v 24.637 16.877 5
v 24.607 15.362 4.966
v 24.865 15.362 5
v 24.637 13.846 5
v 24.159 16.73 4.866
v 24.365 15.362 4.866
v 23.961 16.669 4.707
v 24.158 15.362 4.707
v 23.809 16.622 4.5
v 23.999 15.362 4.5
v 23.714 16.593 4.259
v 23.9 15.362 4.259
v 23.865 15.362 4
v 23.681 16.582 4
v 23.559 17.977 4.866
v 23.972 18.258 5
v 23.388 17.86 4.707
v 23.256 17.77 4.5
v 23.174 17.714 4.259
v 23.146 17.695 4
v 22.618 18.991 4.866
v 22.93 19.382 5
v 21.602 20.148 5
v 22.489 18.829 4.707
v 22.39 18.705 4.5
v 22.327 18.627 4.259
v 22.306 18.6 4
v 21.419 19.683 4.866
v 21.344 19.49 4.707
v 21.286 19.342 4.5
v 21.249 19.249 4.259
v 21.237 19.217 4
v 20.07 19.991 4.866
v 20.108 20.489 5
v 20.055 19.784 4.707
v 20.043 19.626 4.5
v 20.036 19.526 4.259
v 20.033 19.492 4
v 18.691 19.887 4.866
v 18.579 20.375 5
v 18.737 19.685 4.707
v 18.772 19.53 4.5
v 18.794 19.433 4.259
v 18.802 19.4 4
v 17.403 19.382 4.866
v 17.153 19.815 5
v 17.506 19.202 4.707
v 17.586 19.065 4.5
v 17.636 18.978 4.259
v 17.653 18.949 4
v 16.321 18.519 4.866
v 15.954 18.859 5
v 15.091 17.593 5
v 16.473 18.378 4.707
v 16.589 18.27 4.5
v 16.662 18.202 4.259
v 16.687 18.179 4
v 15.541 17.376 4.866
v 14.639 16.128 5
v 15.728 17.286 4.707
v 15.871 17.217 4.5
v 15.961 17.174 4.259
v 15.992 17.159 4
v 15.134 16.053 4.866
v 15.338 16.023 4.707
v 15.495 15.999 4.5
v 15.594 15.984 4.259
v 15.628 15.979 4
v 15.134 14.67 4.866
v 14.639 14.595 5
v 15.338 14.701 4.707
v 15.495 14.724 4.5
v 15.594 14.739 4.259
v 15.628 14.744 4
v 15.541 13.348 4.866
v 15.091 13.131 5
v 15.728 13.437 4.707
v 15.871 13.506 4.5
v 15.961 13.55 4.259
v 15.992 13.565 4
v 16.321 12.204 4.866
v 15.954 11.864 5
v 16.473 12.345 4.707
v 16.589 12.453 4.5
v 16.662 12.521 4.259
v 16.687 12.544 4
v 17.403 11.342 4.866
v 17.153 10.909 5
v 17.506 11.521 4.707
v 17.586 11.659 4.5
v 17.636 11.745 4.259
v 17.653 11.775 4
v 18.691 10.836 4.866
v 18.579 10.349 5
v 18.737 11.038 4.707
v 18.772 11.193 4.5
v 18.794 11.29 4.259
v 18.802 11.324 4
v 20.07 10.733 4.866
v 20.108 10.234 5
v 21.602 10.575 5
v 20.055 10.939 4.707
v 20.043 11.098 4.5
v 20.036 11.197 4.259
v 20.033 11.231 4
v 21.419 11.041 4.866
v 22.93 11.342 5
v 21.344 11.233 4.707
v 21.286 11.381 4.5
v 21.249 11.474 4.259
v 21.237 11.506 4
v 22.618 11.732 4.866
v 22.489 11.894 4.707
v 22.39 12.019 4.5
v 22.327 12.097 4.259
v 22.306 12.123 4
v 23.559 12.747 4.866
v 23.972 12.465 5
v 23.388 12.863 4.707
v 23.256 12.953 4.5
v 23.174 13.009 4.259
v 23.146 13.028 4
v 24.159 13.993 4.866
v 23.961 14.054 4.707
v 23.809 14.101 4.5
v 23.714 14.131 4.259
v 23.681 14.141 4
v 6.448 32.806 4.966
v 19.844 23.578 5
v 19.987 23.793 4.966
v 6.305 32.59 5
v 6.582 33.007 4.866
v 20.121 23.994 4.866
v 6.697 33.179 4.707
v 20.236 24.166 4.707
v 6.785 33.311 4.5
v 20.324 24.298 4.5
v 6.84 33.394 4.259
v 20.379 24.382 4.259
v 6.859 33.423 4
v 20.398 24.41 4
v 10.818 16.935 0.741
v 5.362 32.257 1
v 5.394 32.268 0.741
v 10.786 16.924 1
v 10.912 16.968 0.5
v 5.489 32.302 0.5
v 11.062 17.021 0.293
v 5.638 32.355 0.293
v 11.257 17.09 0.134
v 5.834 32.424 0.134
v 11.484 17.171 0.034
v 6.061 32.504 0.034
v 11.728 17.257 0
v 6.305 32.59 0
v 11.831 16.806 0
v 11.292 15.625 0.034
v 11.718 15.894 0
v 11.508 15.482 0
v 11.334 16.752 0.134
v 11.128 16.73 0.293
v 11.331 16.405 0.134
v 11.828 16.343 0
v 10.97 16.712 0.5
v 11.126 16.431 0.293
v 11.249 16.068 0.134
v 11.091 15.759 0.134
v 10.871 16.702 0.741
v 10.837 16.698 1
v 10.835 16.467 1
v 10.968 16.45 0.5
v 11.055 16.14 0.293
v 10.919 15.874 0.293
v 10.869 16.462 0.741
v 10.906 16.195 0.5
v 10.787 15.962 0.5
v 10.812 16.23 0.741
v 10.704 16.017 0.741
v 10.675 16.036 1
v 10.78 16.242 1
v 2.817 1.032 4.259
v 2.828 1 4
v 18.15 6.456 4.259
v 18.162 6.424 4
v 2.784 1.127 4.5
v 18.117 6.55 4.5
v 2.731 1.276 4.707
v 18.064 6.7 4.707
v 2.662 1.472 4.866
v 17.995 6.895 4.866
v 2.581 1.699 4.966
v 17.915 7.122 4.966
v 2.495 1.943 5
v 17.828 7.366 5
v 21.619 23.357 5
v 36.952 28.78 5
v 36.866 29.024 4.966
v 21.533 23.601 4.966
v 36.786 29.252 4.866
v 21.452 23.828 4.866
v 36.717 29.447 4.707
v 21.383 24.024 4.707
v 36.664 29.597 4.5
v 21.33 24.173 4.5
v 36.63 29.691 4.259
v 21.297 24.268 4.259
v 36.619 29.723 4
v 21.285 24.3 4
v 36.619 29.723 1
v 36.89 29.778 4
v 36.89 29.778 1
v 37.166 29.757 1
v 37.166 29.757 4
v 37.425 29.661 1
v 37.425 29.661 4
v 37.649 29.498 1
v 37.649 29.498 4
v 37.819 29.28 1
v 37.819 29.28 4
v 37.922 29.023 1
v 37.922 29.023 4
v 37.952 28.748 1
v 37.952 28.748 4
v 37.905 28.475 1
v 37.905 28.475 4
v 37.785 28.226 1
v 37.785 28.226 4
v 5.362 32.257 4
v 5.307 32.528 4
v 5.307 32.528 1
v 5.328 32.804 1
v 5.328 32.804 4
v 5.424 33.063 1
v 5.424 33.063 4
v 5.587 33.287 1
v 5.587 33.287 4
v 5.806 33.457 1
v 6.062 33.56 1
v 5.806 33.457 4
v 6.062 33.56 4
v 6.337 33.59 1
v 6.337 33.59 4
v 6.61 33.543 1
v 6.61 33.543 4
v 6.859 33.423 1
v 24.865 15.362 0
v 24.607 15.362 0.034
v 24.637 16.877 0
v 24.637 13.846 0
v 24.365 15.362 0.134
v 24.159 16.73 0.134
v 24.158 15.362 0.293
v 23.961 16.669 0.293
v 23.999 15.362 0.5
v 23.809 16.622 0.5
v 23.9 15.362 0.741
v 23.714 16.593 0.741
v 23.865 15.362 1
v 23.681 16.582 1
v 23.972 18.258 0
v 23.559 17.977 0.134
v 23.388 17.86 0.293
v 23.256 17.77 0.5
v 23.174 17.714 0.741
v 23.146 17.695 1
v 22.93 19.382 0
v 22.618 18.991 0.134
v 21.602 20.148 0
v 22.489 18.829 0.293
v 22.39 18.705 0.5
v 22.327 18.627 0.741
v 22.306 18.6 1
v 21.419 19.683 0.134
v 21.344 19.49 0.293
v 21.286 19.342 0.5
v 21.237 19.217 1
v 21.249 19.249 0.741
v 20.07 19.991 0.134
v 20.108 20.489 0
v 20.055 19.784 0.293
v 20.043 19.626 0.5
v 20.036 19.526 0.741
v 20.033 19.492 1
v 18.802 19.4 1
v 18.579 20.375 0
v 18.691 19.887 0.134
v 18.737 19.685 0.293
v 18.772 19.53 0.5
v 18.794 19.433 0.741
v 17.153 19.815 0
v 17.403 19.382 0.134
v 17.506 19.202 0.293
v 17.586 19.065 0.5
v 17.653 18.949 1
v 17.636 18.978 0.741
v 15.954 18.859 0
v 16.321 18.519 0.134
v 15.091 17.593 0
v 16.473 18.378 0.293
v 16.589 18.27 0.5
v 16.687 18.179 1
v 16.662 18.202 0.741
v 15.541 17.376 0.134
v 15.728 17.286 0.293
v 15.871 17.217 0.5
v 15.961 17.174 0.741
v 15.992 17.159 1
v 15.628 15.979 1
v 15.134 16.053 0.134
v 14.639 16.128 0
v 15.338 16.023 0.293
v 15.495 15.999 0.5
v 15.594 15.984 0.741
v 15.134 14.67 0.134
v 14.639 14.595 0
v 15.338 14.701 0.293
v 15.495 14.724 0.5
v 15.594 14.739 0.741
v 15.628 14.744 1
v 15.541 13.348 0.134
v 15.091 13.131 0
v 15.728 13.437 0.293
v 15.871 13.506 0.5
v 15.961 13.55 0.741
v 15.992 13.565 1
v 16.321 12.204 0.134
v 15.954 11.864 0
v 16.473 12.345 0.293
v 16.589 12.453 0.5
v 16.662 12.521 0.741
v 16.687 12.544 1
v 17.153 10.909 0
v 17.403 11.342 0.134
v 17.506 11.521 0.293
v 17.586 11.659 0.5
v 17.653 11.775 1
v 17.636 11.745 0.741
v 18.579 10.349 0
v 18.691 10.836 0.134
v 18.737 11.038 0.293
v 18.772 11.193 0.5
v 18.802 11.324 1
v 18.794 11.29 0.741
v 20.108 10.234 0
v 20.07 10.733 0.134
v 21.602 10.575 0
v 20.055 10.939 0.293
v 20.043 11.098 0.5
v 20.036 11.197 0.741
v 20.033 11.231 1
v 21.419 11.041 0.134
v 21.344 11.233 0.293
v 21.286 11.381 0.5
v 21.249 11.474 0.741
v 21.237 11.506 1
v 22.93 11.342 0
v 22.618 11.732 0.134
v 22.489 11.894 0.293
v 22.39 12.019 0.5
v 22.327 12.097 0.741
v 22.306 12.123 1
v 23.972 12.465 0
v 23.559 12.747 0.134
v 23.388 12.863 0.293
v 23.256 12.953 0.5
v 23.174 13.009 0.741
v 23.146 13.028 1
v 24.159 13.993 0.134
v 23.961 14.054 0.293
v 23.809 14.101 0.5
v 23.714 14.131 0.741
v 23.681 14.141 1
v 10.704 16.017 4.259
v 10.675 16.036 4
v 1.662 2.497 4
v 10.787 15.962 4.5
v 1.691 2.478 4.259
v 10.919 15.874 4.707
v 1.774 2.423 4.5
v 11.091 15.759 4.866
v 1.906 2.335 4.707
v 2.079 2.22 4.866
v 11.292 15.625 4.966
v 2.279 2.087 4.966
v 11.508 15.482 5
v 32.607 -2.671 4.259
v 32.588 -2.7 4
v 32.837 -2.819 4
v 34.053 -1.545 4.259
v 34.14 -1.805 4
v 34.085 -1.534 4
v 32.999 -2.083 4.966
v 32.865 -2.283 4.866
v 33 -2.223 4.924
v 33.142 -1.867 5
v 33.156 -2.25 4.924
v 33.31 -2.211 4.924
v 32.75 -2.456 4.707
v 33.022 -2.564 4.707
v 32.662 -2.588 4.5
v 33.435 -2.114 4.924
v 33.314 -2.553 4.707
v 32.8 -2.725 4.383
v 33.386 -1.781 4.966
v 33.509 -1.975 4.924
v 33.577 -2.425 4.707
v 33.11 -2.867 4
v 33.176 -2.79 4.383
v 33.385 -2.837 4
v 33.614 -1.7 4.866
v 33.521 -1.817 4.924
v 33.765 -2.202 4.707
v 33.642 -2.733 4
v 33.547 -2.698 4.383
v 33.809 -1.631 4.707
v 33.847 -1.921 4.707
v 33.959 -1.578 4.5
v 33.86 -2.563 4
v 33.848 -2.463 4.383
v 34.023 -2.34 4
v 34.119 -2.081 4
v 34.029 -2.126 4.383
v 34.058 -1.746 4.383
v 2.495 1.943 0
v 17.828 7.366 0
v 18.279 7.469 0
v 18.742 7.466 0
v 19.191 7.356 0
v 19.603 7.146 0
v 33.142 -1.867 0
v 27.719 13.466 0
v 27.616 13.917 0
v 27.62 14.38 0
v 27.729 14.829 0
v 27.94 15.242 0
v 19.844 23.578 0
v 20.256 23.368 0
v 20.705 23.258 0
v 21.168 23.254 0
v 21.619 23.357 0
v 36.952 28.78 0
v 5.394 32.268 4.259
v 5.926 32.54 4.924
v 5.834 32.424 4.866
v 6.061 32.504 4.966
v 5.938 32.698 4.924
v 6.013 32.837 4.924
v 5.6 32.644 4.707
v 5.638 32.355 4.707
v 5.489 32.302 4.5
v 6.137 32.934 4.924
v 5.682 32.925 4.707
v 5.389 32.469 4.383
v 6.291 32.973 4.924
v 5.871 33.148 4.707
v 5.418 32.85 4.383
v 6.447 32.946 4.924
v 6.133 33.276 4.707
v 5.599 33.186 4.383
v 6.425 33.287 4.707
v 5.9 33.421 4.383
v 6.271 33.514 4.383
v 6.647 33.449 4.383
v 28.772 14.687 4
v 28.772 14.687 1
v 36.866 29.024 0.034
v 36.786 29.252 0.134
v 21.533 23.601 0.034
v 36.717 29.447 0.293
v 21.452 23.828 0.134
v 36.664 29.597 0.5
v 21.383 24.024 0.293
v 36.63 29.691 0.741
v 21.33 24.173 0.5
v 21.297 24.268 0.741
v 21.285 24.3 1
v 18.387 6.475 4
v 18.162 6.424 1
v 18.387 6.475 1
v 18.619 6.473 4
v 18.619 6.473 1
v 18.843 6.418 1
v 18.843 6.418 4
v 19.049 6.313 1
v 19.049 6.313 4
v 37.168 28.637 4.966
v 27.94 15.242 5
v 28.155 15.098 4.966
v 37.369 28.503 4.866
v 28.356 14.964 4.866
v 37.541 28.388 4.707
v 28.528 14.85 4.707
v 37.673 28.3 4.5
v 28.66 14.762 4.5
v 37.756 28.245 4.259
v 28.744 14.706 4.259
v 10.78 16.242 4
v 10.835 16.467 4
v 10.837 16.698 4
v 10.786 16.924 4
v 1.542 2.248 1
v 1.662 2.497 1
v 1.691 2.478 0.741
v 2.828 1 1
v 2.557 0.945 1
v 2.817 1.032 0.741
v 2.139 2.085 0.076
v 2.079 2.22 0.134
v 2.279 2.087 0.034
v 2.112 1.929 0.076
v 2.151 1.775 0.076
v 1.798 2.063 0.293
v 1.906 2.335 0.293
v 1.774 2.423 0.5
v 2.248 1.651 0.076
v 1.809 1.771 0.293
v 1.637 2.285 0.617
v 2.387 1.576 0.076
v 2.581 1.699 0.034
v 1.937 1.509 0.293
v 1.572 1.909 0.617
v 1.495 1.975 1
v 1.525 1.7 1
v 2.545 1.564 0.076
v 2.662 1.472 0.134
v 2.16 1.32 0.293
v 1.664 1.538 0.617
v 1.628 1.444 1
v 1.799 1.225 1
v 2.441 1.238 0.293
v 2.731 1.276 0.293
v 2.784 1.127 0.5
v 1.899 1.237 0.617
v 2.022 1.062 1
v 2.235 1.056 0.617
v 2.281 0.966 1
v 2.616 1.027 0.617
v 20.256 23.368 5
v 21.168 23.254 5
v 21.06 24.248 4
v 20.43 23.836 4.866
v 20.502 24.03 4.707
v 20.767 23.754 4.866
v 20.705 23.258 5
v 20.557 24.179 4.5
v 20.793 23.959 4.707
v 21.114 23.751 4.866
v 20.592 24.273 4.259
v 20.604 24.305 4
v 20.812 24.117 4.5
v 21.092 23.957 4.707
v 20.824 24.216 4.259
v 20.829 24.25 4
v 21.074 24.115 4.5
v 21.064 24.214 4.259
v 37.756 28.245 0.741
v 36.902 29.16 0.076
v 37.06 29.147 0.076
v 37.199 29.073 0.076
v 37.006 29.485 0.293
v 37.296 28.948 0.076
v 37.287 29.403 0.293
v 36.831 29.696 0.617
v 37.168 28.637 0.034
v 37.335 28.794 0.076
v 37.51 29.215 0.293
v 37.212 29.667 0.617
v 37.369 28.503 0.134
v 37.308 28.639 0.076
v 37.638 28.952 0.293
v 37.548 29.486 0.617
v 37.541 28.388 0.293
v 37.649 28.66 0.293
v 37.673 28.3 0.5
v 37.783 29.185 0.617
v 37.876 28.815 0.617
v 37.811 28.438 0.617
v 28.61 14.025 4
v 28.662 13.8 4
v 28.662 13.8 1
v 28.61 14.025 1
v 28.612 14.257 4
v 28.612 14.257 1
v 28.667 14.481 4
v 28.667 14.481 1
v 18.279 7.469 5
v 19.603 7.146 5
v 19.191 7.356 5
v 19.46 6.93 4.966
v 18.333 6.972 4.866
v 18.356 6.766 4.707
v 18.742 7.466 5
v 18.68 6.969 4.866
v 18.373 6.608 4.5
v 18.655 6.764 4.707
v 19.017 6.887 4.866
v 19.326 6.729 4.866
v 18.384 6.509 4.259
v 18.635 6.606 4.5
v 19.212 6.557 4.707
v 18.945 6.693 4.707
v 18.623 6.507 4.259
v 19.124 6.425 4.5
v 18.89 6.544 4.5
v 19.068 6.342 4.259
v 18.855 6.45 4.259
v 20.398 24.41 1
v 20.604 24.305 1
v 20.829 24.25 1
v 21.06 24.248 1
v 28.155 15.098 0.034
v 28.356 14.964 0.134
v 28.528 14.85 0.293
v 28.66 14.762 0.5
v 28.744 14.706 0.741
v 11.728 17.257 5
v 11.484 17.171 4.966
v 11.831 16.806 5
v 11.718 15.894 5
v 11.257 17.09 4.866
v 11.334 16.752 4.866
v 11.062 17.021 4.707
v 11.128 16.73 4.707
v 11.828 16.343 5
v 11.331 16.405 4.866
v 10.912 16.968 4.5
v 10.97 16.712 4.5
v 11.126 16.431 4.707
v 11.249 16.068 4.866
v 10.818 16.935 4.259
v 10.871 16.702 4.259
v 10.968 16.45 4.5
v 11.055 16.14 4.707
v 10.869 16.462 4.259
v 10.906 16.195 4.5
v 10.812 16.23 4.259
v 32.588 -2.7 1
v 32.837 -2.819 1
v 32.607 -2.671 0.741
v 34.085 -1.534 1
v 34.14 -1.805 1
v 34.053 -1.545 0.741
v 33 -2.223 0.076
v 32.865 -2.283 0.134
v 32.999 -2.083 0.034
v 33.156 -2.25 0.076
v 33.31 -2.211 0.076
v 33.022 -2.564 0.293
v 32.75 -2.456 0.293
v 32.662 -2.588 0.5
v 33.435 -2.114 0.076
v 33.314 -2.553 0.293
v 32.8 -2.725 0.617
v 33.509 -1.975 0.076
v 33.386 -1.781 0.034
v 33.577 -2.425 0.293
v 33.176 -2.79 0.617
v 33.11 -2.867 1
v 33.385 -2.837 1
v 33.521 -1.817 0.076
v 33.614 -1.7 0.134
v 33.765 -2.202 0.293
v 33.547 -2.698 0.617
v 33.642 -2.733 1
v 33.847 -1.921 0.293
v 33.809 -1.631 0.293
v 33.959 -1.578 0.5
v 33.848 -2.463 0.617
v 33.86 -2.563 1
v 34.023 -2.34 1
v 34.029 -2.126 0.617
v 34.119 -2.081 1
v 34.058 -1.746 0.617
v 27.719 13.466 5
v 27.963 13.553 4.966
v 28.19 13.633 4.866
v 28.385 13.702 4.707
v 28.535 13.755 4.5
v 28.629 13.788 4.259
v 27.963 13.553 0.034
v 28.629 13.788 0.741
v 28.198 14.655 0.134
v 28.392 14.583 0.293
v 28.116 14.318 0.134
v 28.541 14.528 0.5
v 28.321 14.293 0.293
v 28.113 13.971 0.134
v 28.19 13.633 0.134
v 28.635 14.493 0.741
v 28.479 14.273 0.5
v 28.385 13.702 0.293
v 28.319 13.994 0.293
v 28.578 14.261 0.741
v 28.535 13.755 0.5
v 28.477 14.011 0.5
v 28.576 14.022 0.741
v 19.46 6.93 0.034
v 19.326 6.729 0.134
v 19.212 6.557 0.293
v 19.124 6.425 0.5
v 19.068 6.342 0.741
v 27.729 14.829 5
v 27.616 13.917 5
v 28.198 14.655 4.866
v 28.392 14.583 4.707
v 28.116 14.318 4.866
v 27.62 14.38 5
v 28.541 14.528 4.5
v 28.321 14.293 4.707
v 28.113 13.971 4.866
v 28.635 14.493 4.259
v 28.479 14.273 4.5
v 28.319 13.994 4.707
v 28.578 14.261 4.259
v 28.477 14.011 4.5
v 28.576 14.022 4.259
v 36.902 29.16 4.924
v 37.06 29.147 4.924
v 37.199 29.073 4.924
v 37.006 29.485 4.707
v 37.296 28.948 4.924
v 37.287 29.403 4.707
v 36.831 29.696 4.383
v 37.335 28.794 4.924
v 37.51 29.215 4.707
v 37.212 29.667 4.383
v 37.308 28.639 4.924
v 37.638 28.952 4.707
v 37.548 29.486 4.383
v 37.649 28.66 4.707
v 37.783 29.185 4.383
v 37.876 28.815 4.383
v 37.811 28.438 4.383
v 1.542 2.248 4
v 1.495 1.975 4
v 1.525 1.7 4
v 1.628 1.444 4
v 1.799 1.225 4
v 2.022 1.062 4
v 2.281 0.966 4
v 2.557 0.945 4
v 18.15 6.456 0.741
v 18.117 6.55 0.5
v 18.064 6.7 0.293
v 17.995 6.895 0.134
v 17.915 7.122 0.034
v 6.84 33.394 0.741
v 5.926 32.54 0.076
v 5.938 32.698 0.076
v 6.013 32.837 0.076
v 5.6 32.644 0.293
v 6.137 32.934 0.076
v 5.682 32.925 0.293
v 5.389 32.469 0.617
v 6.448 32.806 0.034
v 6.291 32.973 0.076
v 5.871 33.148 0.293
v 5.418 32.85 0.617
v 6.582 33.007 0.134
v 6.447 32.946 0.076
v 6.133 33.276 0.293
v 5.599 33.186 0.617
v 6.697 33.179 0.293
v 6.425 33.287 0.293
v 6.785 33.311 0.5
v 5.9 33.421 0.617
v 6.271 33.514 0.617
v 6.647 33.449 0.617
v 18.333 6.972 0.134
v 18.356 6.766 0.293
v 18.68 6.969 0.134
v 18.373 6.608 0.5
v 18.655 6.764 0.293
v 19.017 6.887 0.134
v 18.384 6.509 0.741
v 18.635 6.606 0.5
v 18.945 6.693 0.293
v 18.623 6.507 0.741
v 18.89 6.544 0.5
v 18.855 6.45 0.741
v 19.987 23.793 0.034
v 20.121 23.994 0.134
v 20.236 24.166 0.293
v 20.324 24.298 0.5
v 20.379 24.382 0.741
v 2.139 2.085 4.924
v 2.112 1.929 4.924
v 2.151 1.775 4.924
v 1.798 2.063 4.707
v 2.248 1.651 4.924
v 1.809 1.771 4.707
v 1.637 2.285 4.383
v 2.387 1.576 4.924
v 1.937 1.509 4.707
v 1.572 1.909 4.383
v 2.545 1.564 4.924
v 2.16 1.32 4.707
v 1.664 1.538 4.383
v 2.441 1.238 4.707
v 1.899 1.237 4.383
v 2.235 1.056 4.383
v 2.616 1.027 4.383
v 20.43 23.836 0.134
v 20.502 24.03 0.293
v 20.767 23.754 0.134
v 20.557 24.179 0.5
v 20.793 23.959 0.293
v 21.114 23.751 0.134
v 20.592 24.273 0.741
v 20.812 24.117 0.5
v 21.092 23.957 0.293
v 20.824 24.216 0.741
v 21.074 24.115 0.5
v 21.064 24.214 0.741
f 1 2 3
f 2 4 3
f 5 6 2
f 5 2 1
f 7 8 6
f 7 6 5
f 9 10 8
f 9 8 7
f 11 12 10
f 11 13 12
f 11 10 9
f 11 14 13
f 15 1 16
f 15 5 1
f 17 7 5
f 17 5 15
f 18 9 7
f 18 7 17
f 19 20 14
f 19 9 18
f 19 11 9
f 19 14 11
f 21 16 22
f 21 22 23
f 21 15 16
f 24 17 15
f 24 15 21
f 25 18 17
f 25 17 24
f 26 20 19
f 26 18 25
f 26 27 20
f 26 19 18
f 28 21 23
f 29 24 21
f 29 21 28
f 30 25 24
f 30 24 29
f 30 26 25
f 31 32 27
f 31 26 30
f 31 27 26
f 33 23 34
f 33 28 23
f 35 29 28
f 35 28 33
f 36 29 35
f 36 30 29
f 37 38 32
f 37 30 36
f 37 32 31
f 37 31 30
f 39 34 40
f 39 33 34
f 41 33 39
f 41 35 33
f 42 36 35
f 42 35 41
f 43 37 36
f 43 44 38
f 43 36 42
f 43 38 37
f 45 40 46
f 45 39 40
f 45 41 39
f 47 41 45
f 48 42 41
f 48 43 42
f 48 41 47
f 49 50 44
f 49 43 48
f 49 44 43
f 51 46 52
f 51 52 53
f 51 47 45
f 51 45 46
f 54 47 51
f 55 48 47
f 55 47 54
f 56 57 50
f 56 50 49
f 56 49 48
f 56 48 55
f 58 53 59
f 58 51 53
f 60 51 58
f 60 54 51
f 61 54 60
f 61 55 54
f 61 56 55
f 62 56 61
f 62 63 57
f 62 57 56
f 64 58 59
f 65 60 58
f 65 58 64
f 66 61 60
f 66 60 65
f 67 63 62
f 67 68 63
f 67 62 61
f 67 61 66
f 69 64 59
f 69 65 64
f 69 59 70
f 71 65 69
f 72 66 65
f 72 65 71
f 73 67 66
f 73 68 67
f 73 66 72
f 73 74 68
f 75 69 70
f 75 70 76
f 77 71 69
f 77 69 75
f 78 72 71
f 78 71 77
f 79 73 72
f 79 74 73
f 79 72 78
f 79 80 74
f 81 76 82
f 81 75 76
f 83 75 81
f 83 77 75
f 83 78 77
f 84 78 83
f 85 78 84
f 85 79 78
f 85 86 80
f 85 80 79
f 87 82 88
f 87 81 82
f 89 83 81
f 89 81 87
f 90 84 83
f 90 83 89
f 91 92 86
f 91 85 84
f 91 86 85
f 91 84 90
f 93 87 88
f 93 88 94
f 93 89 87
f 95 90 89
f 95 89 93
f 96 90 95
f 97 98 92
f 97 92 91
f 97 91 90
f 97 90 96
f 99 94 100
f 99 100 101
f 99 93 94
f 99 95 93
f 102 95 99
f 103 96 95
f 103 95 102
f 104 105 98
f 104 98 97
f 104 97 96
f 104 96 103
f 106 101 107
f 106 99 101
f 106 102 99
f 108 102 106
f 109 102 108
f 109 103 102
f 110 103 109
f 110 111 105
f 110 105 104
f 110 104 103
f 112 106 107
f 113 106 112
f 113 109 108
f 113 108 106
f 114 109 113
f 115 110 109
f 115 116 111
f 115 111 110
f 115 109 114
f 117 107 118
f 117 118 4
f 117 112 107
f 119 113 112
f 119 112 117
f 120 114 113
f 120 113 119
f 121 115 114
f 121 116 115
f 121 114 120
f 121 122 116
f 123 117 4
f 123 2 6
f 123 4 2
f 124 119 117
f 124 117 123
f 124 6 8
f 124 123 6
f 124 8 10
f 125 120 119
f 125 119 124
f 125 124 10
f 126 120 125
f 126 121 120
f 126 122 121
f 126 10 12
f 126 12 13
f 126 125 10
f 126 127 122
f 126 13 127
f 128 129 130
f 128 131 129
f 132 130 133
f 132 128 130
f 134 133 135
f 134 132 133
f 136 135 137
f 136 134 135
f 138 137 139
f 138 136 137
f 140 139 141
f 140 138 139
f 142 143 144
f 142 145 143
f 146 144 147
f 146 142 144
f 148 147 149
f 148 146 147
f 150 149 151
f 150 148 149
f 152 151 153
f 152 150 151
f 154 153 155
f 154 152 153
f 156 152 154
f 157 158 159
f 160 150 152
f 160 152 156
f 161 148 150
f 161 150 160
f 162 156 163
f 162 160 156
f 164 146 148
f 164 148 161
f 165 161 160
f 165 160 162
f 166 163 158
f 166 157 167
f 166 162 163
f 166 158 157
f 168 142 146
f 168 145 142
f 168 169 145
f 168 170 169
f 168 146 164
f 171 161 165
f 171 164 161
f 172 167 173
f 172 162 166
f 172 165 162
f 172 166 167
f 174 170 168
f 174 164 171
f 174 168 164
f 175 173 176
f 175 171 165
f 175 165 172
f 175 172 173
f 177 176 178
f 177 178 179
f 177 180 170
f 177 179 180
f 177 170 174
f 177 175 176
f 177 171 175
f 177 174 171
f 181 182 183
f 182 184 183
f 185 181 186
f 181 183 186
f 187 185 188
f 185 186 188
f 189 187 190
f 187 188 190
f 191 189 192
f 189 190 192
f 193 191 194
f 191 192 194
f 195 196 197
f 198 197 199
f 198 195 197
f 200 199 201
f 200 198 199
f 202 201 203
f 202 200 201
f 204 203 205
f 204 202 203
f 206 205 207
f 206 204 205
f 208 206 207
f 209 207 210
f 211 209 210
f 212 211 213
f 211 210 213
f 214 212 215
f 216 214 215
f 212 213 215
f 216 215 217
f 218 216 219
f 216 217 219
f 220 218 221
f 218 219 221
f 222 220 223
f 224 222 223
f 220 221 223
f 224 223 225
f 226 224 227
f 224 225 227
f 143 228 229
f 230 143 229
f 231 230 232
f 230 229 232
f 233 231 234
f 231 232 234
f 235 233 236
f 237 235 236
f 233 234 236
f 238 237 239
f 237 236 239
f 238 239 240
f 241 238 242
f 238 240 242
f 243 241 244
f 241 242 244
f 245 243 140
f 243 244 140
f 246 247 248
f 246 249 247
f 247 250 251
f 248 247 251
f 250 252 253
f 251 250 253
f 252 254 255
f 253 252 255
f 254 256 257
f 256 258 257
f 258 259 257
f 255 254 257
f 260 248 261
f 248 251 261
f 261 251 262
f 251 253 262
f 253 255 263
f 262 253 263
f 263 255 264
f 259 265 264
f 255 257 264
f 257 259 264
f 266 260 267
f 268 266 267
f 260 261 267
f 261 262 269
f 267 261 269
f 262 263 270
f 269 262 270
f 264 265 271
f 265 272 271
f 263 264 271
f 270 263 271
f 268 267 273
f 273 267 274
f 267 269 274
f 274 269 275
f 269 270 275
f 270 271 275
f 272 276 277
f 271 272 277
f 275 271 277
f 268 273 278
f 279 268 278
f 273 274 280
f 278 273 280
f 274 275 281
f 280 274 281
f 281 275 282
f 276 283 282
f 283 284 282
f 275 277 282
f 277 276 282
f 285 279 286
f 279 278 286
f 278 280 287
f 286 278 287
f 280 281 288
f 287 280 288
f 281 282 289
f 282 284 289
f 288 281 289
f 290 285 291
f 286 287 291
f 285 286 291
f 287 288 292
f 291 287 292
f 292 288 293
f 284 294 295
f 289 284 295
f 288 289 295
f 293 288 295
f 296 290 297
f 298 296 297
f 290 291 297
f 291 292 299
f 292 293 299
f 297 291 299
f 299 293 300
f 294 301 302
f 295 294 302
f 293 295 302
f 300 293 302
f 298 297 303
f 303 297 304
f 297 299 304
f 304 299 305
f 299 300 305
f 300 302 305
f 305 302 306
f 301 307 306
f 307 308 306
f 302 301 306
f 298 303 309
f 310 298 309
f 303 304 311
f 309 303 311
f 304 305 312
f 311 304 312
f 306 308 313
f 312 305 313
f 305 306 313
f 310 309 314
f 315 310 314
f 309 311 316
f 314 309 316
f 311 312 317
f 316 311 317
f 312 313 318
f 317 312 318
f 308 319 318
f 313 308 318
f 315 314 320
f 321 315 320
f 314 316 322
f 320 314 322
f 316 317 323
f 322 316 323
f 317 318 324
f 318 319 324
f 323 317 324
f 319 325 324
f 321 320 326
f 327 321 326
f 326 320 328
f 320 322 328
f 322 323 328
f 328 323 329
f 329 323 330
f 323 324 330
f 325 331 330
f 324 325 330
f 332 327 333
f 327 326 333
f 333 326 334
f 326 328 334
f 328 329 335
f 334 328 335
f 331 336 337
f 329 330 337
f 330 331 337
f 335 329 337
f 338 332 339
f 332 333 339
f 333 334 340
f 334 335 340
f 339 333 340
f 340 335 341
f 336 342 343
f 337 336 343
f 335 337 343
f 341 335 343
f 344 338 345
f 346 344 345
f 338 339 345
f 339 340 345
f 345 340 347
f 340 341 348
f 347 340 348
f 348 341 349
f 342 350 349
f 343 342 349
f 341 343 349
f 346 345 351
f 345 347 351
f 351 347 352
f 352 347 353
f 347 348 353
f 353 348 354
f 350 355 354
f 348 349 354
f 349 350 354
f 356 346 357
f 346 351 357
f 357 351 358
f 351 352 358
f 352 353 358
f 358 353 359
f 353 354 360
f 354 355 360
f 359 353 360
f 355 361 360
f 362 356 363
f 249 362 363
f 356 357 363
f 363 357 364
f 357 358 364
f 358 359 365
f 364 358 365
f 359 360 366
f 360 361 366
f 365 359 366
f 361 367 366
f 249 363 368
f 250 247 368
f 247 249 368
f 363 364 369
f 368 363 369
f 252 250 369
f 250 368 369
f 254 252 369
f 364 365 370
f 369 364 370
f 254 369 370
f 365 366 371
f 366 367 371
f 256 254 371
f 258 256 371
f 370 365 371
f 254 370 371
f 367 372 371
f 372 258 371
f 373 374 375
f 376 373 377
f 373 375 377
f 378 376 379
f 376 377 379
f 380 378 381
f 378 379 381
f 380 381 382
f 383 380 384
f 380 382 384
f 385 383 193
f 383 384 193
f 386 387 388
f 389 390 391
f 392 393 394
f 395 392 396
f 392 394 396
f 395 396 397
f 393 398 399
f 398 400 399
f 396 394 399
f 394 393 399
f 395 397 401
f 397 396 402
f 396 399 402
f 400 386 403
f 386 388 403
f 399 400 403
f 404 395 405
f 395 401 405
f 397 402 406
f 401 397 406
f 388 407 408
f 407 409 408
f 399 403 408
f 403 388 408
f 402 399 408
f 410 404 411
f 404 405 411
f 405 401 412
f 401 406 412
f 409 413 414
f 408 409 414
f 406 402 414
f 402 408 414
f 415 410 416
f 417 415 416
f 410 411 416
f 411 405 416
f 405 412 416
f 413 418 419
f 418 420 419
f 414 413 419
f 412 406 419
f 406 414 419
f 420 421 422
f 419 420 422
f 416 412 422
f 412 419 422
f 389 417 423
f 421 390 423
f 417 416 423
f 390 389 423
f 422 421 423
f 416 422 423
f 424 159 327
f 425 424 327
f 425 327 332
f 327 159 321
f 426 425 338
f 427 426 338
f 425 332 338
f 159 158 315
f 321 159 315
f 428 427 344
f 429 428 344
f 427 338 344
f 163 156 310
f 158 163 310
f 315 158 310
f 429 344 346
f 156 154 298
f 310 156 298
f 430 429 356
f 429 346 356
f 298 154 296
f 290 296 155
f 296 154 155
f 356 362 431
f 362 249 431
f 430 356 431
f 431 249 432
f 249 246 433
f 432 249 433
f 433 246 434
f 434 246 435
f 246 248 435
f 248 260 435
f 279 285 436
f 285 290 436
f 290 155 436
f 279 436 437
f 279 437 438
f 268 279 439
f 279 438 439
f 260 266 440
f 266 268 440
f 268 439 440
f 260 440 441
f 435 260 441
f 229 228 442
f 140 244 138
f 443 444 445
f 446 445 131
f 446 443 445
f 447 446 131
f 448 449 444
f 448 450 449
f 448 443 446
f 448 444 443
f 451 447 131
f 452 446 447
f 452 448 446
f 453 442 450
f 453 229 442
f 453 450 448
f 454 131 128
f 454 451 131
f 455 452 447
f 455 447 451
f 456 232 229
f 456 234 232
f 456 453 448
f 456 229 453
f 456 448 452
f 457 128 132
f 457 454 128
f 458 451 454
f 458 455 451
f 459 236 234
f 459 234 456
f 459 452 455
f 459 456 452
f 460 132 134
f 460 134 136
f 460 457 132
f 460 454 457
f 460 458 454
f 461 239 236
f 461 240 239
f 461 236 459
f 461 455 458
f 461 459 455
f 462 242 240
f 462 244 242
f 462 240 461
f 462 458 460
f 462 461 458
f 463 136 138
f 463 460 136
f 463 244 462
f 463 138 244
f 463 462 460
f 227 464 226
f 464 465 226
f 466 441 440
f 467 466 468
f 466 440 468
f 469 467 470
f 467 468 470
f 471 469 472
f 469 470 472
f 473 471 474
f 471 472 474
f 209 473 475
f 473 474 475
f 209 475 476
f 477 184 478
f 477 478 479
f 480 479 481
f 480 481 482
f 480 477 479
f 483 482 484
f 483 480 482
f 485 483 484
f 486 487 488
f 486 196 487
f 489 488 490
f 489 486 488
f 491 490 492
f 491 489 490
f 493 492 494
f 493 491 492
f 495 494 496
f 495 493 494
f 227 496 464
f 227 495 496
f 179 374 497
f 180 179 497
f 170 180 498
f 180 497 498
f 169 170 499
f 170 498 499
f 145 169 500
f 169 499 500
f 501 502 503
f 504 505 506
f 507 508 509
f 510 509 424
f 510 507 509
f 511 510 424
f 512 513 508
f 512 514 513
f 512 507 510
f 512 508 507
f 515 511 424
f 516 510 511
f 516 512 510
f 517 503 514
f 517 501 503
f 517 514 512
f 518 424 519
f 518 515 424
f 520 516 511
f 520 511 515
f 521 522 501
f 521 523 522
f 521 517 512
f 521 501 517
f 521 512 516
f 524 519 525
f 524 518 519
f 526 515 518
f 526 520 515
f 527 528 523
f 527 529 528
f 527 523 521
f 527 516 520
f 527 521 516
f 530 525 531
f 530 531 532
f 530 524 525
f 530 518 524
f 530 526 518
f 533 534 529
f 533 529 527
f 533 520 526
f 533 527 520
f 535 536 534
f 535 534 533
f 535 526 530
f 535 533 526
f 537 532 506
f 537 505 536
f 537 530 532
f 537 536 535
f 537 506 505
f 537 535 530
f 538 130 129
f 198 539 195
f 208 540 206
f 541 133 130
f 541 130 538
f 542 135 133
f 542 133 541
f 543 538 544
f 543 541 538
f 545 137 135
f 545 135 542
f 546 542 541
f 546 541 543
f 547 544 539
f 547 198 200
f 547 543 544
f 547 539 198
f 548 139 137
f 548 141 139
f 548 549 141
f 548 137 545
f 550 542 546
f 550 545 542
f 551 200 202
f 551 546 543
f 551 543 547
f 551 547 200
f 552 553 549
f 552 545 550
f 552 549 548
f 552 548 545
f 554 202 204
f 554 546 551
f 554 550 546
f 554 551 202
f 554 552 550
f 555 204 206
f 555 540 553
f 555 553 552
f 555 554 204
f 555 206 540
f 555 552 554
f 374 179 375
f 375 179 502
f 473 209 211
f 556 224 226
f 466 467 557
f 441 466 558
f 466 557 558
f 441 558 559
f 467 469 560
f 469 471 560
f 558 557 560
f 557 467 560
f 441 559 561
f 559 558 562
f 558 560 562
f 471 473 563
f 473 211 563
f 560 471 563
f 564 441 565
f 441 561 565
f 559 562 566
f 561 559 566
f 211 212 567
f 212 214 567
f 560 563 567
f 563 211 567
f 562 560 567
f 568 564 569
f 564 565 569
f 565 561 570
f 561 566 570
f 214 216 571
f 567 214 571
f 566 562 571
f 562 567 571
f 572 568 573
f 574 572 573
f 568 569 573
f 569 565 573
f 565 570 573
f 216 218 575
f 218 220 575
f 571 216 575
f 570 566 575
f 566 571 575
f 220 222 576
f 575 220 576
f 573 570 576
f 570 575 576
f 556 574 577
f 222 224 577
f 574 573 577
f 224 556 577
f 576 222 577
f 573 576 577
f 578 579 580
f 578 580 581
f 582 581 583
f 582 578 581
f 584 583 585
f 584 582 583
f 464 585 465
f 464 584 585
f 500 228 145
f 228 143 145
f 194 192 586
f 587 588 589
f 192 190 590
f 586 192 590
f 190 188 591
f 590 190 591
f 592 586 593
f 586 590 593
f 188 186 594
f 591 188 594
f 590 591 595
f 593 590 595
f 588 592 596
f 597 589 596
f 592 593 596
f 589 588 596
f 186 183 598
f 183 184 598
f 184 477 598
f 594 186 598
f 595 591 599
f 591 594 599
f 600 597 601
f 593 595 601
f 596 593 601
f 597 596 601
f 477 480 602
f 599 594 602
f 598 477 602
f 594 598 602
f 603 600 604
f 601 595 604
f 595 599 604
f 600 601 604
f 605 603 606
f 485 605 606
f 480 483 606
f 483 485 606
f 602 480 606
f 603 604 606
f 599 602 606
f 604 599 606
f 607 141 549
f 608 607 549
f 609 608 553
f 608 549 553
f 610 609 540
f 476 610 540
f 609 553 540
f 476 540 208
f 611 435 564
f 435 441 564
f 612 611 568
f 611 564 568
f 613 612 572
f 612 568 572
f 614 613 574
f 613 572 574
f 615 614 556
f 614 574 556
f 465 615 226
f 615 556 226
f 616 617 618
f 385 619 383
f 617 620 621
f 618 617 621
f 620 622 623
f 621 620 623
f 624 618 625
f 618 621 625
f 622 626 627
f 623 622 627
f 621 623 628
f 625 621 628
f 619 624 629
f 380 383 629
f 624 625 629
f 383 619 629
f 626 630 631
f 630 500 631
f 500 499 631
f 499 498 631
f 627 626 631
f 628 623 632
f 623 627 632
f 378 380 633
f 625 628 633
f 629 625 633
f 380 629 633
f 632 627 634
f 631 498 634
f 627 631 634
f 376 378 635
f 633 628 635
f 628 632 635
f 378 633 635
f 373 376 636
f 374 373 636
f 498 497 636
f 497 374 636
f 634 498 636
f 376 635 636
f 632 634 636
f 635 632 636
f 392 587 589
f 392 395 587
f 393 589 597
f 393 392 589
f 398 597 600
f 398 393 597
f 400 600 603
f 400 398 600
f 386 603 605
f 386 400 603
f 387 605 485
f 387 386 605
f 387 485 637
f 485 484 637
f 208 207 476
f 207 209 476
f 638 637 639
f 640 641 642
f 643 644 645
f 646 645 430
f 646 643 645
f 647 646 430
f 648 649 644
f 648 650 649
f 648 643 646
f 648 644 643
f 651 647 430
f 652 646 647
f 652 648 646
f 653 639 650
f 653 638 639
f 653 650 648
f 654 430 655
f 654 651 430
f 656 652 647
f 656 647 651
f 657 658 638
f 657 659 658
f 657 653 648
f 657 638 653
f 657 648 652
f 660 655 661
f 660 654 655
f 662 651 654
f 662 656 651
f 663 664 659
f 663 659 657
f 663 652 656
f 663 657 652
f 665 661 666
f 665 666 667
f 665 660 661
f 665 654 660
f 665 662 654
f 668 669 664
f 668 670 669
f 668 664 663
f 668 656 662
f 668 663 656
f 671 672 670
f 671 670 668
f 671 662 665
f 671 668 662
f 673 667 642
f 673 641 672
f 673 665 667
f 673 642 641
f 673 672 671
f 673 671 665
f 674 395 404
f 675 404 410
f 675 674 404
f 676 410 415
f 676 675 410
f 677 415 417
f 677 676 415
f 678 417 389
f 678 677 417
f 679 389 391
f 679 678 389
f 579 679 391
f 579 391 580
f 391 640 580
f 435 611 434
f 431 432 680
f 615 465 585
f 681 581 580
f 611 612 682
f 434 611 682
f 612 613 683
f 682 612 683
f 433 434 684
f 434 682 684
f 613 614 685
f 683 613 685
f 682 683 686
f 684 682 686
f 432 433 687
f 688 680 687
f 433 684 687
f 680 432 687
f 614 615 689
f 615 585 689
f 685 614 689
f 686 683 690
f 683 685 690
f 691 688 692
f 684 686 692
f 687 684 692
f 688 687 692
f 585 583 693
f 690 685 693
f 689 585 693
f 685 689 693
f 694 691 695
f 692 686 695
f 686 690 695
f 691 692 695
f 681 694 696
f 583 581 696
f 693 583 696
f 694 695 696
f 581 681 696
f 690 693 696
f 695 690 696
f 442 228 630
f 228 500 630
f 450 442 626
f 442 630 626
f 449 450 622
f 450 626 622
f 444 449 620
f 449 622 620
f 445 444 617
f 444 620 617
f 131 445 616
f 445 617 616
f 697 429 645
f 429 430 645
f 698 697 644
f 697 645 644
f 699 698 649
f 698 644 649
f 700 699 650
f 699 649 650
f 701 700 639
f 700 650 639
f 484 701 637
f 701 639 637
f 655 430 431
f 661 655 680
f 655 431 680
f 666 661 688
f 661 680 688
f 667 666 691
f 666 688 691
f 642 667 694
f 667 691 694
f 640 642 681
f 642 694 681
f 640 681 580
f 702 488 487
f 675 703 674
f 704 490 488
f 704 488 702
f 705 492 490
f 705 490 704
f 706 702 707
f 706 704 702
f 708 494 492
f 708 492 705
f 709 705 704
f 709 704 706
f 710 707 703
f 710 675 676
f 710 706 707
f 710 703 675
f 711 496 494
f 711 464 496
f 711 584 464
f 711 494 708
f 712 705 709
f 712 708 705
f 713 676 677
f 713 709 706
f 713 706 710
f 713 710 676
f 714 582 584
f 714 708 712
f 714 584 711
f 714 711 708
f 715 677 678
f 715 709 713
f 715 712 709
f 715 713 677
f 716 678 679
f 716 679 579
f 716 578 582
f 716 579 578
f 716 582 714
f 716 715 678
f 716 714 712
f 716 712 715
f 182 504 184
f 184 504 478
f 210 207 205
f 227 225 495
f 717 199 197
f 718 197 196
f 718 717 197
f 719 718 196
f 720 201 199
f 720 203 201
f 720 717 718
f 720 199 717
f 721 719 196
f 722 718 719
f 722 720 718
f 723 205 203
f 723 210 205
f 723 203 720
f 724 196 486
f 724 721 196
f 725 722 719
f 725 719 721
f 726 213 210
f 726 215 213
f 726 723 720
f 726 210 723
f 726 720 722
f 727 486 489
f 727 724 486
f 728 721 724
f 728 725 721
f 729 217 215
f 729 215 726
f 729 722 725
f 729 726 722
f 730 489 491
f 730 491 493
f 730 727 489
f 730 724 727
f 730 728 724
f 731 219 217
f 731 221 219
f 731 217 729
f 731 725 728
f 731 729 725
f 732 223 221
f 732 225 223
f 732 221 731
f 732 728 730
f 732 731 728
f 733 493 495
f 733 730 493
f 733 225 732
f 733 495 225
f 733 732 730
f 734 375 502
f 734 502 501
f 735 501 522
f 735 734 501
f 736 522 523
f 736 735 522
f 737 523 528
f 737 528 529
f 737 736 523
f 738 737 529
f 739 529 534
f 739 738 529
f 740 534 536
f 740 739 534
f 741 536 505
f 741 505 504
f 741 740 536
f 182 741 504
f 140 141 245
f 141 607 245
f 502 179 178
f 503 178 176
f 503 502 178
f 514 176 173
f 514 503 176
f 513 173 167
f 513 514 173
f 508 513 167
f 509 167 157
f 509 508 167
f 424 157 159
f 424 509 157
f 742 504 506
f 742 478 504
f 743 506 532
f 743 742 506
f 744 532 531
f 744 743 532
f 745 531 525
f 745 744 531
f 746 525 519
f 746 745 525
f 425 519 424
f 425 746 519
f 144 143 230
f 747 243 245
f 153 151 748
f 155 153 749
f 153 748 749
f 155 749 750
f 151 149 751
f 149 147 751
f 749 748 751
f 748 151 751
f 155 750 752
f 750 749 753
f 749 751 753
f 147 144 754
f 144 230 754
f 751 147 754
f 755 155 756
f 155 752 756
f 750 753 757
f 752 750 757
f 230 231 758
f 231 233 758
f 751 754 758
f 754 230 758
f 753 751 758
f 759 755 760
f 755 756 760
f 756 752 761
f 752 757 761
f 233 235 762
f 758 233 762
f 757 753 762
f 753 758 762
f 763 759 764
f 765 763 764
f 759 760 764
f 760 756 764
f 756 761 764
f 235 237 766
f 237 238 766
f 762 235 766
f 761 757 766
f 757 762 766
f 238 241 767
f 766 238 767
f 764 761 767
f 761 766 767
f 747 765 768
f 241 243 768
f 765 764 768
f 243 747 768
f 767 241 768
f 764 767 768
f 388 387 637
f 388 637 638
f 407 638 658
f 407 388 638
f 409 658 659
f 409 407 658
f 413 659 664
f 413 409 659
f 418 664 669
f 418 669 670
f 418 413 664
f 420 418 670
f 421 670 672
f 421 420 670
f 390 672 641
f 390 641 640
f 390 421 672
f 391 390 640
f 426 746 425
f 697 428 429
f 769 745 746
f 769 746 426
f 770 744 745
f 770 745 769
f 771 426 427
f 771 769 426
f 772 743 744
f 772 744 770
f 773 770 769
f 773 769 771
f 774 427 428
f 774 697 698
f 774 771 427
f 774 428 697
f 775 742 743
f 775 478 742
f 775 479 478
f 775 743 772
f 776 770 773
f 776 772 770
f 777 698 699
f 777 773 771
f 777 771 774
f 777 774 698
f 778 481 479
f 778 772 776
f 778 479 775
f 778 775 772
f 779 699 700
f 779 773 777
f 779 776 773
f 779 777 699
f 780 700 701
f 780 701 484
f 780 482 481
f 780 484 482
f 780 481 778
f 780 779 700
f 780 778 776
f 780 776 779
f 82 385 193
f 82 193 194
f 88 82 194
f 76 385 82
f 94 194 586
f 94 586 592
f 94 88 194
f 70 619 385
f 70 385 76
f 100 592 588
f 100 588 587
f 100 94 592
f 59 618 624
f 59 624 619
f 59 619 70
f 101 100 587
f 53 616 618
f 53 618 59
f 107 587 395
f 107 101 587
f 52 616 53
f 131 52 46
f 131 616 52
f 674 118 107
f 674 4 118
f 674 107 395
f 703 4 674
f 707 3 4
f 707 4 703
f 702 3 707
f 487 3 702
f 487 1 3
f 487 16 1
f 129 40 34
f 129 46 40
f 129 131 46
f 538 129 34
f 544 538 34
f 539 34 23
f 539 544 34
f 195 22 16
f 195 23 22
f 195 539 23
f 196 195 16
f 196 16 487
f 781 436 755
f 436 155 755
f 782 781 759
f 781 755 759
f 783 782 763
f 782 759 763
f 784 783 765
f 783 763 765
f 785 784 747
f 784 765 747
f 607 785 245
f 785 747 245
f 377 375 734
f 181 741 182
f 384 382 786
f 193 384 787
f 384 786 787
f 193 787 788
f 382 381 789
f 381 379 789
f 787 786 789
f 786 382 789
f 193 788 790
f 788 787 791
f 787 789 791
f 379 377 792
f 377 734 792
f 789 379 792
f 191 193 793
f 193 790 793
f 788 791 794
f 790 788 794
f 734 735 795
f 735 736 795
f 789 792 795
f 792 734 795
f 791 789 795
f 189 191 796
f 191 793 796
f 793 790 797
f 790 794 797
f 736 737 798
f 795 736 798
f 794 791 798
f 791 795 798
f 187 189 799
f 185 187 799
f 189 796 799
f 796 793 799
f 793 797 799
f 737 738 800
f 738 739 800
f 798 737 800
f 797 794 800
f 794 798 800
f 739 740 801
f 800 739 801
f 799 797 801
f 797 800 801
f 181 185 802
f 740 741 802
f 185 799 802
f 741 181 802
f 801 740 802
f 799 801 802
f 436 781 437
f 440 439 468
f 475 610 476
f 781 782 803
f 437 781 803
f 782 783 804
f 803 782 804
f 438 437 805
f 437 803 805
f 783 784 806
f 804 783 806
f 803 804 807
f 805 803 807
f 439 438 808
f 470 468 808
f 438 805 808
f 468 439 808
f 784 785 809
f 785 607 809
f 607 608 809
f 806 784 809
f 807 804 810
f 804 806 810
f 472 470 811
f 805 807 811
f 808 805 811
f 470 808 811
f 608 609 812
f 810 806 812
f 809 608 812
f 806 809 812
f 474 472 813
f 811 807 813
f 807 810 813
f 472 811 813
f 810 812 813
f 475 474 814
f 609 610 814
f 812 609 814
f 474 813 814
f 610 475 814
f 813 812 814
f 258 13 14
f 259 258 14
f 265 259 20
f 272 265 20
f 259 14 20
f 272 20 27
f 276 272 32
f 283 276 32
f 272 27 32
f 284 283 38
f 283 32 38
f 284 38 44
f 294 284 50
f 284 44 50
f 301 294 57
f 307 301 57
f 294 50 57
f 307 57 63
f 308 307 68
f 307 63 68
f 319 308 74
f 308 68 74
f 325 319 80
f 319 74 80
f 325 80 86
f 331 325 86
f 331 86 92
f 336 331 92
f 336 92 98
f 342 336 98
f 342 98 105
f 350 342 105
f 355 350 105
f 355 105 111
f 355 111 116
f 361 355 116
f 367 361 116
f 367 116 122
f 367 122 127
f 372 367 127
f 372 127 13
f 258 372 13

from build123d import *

# Parameters (mm, degrees)
F1_DEPTH = 5
F2_R     = 4.141885
F3_DEPTH = 25
F4_R     = 1


with BuildPart() as f1:
    # F0 (on Top) → F1 (new body)
    with BuildSketch(Plane.XY):
        Polygon((10.952281, 16.452128), (0, 0), (19.723589, 15.361642), (4.361948, 35.085231), align=None)
        Polygon((19.723589, 15.361642), (0, 0), (18.633102, 6.590334), (35.085231, -4.361948), align=None)
        Polygon((39.447178, 30.723283), (19.723589, 15.361642), (35.085231, -4.361948), (28.494897, 14.271155), align=None)
        Polygon((4.361948, 35.085231), (19.723589, 15.361642), (39.447178, 30.723283), (20.814076, 24.132949), align=None)
    extrude(amount=F1_DEPTH)

    # F2 (on face) → F3 (cut)
    with BuildSketch(Plane.XY.offset(5)):
        with Locations((19.723589, 15.361642)):
            Circle(F2_R)
    extrude(amount=-F3_DEPTH, mode=Mode.SUBTRACT)

    # F4
    f4_edges = [f1.edges().sort_by_distance(p)[0] for p in [
        (7.657115, 25.76868, 5),
        (12.588012, 29.60909, 5),
        (5.476141, 8.226064, 5),
        (30.130627, 27.428116, 5),
        (9.316551, 3.295167, 5),
        (33.971038, 22.497219, 5),
        (26.859166, 1.114193, 5),
        (31.790064, 4.954604, 5),
        (15.581704, 15.361642, 5),
        (7.657115, 25.76868, 0),
        (12.588012, 29.60909, 0),
        (5.476141, 8.226064, 0),
        (30.130627, 27.428116, 0),
        (9.316551, 3.295167, 0),
        (33.971038, 22.497219, 0),
        (26.859166, 1.114193, 0),
        (31.790064, 4.954604, 0),
        (15.581704, 15.361642, 0),
        (35.085231, -4.361948, 2.5),
        (28.494897, 14.271155, 2.5),
        (39.447178, 30.723283, 2.5),
        (20.814076, 24.132949, 2.5),
        (4.361948, 35.085231, 2.5),
        (10.952281, 16.452128, 2.5),
        (0, 0, 2.5),
        (18.633102, 6.590334, 2.5),
    ]]
    fillet(f4_edges, radius=F4_R)


solid = f1.part
